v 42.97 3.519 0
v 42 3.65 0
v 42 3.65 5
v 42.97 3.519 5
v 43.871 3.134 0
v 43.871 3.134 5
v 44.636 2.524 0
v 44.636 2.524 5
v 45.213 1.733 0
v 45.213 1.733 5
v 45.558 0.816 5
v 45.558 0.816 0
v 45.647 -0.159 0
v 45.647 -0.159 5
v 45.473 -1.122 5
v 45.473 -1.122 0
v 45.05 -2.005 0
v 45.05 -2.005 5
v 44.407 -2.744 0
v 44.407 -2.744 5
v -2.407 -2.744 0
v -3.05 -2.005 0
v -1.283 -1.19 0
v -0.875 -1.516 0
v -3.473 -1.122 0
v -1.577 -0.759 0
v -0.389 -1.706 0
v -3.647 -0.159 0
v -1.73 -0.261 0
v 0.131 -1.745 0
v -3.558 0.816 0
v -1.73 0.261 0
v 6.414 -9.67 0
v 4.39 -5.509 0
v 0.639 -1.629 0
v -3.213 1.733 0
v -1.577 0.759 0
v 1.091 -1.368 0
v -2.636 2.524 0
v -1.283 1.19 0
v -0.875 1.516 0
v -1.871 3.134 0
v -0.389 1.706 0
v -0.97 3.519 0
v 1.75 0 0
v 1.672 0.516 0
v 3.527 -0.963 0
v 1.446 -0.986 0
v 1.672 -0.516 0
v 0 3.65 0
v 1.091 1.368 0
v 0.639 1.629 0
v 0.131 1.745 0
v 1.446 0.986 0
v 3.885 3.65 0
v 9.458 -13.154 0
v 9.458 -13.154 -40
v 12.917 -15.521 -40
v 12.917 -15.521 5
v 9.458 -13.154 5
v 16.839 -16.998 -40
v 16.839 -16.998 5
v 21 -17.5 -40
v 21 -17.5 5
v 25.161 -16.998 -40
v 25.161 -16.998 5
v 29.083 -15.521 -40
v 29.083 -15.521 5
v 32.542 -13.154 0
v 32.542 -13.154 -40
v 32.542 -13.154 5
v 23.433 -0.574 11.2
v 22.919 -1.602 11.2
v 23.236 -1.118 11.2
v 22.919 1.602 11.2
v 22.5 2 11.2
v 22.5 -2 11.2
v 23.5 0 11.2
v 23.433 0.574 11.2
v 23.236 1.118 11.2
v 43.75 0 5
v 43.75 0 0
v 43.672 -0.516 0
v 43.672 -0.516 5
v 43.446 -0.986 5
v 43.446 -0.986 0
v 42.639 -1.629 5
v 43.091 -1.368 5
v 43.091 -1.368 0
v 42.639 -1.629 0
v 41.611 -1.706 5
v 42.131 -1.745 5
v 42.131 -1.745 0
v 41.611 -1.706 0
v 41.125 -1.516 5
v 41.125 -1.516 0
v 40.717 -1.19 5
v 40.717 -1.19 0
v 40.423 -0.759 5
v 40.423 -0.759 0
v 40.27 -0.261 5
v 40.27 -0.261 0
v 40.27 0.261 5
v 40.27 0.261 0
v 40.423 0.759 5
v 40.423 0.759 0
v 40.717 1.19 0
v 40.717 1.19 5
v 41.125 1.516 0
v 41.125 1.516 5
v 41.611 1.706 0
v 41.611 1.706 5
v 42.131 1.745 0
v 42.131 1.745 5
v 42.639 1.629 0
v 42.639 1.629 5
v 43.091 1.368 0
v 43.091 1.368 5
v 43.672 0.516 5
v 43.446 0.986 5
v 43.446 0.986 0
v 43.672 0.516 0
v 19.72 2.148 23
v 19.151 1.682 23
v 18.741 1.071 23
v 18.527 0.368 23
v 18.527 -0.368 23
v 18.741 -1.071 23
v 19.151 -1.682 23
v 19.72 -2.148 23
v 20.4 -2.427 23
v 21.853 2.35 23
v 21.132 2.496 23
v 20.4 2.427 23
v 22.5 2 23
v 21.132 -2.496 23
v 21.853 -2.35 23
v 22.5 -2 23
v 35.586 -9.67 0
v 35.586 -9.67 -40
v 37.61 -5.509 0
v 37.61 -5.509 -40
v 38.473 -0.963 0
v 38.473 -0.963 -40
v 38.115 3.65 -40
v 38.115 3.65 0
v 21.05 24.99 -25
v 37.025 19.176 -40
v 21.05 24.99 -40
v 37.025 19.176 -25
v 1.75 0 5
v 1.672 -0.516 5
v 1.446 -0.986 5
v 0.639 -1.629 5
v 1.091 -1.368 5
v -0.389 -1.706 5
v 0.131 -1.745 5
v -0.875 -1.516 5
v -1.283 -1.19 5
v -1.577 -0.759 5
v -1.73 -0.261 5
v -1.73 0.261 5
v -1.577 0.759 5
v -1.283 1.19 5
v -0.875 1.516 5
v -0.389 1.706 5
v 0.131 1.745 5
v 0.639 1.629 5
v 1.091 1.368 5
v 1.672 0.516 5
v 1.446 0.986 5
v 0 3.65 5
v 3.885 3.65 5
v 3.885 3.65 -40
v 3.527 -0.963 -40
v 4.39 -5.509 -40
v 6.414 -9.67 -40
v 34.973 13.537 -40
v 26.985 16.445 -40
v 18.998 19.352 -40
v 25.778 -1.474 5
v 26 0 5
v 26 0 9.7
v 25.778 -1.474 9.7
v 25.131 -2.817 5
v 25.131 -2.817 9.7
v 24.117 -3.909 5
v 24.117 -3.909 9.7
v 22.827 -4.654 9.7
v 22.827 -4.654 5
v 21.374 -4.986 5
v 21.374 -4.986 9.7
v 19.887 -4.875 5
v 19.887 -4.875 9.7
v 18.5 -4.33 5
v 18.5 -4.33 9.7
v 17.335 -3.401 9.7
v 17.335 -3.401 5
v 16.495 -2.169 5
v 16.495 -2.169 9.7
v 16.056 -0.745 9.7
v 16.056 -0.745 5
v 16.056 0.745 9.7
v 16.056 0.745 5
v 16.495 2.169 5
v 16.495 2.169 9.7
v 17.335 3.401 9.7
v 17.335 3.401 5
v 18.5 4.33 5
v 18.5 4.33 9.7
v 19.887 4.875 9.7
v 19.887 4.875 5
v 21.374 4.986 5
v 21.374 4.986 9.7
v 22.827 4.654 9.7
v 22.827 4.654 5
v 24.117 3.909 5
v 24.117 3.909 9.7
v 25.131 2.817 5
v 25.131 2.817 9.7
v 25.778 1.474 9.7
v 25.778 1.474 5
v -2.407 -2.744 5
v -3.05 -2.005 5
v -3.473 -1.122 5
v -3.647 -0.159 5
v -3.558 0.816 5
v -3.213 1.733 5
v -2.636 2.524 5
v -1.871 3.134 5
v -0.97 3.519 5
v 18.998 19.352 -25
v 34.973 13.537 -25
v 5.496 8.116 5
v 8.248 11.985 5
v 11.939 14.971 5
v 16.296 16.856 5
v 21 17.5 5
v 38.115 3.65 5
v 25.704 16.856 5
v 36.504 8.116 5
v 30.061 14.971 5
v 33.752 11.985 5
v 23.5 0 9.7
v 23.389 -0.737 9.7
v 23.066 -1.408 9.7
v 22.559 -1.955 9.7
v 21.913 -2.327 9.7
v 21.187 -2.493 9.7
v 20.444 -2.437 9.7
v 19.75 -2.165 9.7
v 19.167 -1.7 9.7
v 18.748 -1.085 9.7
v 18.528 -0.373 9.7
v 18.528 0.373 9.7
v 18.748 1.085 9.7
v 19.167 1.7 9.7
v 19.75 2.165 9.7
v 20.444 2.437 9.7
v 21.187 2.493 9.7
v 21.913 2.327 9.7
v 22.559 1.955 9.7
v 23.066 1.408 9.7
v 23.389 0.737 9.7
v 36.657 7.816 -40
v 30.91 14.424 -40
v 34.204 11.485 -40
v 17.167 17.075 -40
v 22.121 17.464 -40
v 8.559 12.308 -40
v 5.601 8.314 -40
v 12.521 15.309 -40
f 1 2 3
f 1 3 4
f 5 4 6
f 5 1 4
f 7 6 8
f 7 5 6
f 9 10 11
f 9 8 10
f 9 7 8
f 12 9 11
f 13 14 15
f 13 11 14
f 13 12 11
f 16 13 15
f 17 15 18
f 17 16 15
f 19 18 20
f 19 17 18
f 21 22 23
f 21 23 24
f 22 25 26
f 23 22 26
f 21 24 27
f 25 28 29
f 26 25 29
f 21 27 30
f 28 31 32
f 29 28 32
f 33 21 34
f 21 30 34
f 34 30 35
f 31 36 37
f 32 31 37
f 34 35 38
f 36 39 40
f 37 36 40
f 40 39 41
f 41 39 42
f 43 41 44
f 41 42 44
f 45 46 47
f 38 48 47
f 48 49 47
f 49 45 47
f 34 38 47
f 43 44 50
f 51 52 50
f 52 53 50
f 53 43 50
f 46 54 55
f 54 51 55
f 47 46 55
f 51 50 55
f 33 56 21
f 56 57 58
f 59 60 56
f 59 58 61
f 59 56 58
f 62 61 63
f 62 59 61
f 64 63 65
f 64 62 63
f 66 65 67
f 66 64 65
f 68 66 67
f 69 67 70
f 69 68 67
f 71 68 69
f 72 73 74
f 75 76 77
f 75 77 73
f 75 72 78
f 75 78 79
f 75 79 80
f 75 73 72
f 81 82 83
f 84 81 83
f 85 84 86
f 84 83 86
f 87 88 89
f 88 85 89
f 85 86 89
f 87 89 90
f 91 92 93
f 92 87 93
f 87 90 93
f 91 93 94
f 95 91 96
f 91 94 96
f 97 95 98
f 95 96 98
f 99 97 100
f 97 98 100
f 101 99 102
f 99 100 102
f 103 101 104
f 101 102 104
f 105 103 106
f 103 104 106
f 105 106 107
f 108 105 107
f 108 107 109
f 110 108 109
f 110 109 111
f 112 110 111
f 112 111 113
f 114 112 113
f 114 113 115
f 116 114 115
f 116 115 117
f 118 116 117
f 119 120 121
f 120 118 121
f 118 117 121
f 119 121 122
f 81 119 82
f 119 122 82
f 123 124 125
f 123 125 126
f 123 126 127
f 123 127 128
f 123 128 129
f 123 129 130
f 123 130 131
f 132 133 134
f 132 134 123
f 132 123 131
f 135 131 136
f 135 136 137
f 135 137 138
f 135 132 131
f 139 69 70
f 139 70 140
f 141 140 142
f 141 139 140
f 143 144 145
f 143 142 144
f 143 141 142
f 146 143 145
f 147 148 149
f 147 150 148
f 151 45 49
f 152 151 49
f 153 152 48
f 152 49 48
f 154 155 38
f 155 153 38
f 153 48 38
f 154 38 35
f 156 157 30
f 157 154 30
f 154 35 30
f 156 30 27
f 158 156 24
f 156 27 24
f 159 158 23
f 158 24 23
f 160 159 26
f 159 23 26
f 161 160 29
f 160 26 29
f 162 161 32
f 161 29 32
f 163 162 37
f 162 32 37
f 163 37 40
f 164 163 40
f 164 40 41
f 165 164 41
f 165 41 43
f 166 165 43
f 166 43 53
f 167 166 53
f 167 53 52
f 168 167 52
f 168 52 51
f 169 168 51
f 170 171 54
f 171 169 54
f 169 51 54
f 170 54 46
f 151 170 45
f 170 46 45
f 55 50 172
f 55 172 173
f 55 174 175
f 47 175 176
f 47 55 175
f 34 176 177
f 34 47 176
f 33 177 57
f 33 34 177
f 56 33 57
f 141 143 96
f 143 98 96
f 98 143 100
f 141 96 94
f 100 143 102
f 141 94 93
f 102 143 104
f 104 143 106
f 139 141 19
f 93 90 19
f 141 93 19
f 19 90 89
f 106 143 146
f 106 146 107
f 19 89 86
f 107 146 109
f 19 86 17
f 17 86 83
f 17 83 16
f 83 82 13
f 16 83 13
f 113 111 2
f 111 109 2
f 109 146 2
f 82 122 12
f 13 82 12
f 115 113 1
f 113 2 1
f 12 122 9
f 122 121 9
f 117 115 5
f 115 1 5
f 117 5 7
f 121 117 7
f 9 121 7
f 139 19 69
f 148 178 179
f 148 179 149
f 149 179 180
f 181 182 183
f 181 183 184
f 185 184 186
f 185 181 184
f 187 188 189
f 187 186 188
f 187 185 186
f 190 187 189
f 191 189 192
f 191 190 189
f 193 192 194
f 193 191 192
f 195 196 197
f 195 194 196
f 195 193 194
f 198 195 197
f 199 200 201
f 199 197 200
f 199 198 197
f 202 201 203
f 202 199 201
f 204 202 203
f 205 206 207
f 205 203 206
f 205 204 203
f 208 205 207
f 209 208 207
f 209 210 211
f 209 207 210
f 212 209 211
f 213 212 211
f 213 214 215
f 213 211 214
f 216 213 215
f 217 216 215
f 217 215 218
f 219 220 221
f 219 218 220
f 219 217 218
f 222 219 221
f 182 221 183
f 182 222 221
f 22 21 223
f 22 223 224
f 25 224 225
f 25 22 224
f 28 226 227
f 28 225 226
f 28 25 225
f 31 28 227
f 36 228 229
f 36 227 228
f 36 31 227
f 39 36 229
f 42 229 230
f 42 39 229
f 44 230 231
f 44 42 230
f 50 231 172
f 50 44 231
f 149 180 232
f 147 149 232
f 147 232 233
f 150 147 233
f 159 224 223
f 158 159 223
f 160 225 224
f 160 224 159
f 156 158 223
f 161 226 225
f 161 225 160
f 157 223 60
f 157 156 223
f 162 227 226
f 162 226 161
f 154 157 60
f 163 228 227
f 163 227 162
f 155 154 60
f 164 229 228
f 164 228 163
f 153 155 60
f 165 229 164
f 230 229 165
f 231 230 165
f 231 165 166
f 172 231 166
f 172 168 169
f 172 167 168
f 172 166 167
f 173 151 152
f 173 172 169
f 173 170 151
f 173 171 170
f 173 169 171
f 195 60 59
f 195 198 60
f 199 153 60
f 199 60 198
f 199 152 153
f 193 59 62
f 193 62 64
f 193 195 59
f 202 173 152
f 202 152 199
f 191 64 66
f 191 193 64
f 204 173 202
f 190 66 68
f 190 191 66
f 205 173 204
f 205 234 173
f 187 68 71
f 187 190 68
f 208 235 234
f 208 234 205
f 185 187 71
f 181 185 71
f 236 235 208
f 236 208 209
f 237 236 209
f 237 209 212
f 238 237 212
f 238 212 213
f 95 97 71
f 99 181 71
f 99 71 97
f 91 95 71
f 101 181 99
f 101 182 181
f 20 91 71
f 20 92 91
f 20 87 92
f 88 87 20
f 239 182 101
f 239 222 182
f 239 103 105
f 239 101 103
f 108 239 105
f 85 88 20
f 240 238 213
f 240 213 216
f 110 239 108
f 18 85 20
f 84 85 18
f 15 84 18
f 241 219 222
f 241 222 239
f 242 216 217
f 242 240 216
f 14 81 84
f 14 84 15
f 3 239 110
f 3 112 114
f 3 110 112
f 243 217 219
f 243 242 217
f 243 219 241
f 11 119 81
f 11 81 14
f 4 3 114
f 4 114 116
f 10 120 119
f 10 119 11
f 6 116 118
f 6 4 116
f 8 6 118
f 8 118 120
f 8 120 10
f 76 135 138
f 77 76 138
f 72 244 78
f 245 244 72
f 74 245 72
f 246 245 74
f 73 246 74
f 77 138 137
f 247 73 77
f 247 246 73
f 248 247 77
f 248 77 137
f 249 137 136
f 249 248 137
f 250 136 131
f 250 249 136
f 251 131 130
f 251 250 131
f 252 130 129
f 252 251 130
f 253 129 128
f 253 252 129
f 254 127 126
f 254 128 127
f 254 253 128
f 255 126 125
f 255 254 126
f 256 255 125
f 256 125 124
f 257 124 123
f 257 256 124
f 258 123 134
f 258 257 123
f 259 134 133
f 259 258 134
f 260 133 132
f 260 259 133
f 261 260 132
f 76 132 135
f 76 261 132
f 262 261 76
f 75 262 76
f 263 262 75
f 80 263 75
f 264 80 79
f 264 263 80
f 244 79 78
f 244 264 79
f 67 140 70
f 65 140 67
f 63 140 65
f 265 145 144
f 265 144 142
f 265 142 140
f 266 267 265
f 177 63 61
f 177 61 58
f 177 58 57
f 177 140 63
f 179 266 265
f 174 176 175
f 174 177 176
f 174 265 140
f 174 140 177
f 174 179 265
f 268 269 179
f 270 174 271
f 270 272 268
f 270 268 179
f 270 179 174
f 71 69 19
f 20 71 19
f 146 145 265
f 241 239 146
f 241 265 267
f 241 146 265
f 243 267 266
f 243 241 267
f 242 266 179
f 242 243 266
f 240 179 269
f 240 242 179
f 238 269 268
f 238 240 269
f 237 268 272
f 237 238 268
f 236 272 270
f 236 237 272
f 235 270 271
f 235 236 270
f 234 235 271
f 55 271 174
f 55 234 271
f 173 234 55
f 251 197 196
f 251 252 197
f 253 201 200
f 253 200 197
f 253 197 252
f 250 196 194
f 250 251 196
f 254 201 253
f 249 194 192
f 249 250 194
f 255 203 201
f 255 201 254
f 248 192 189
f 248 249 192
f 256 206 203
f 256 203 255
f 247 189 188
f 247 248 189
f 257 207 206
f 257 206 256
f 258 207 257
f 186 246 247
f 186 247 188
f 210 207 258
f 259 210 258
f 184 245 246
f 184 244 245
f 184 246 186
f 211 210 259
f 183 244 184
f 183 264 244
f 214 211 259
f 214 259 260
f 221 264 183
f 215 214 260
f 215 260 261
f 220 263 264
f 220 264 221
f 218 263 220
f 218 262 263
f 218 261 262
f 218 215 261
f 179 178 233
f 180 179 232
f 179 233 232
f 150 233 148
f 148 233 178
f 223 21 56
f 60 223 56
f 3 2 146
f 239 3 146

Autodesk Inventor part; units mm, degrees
ref_plane "YZ Plane" through (0, 0, 0) normal (1, 0, 0) x (0, 1, 0)
ref_plane "XZ Plane" through (0, 0, 0) normal (0, 1, 0) x (-1, 0, 0)
ref_plane "XY Plane" through (0, 0, 0) normal (0, 0, 1) x (1, 0, 0)
sketch "Sketch1" plane through (0, 0, 0) normal (0, 0, 1) x (1, 0, 0)
  circle A0 centre (0, 0) radius 1.75
  circle A1 centre (42, 0) radius 1.75
  arc A2 (0, 3.65) -> (-2.4073, -2.7436) centre (0, 0) ccw
  arc A3 (44.4073, -2.7436) -> (42, 3.65) centre (42, 0) ccw
  line L0 (-2.4073, -2.7436) -> (9.4583, -13.1545)
  line L1 (32.5417, -13.1545) -> (44.4073, -2.7436)
  line L2 (42, 3.65) -> (38.1151, 3.65)
  line L3 (0, 3.65) -> (3.8849, 3.65)
  arc A4 (9.4583, -13.1545) -> (32.5417, -13.1545) centre (21, 0) ccw
  arc A5 (38.1151, 3.65) -> (3.8849, 3.65) centre (21, 0) ccw
  dimension "d0" = 3.5
  dimension "d2" = 42
  dimension "d3" = 7.3
  dimension "d5" = 21
  dimension "d6" = 17.5
  dimension "d7" = 17.5
extrude "Extrusion1" add sketch "Sketch1" along normal blind 5
sketch "Sketch2" plane through (0, 0, 5) normal (0, 0, 1) x (1, 0, 0)
  arc A0 (38.1151, 3.65) -> (3.8849, 3.65) centre (21, 0) ccw projected
  circle A1 centre (21, 0) radius 5
  dimension "d10" = 10
extrude "Extrusion2" add sketch "Sketch2" along normal blind 4.7
sketch "Sketch3" plane through (21, 0, 9.7) normal (0, 0, 1) x (1, 0, 0)
  circle A0 centre (0, 0) radius 5 projected
  circle A1 centre (0, 0) radius 2.5
  point P0 (-21, 0)
  dimension "d13" = 5
extrude "Extrusion3" add sketch "Sketch3" along normal blind 1.5 contours A1
sketch "Sketch4" plane through (21, 0, 11.2) normal (0, 0, 1) x (1, 0, 0)
  circle A0 centre (0, 0) radius 2.5 projected
  line L0 (1.5, 2) -> (1.5, -2)
  point P0 (-21, 0)
  dimension "d16" = 4
extrude "Extrusion4" add sketch "Sketch4" along normal blind 11.8 contours L0 A0 picked at (0.1918, -0.203)
sketch "Sketch5" plane through (0, 0, 0) normal (0, 0, -1) x (-1, 0, 0)
  arc A0 (-3.8849, 3.65) -> (-38.1151, 3.65) centre (-21, 0) ccw projected
  arc A1 (-32.5417, -13.1545) -> (-9.4583, -13.1545) centre (-21, 0) ccw projected
  circle A2 centre (-21, 0) radius 17.5
extrude "Extrusion5" add sketch "Sketch5" along normal blind 40
sketch "Sketch6" plane through (21, 0, -40) normal (0, 0, -1) x (-1, 0, 0)
  circle A0 centre (0, 0) radius 17.5 projected
  arc A1 (-1.5, -2) -> (-1.5, 2) centre (0, 0) ccw construction
  line L0 (0, 0) -> (-5.9854, 16.4446) construction
  circle A2 centre (21, 0) radius 1.75 construction
  line L1 (21, 0) -> (-17.5, 0) construction
  dimension "d21" = 70
ref_plane "Work Plane1" through (26.9854, 16.4446, -40) normal (0.342, 0.9397, 0) x (-0.9397, 0.342, 0)
sketch "Sketch7" plane through (26.9854, 16.4446, -40) normal (0.342, 0.9397, 0) x (-0.9397, 0.342, 0)
  line L0 (-17.5, 0) -> (17.5, 0) projected
  line L1 (0, 0) -> (8.5, 0)
  line L2 (8.5, 0) -> (8.5, 15)
  line L3 (8.5, 15) -> (-8.5, 15)
  line L4 (-8.5, 15) -> (-8.5, 0)
  line L5 (-8.5, 0) -> (0, 0)
  point P0 (19.7335, 40)
  dimension "d22" = 8.5
  dimension "d23" = 15
  dimension "d24" = 17
extrude "Extrusion6" add sketch "Sketch7" along normal blind 6
properties part number "PG35L"
